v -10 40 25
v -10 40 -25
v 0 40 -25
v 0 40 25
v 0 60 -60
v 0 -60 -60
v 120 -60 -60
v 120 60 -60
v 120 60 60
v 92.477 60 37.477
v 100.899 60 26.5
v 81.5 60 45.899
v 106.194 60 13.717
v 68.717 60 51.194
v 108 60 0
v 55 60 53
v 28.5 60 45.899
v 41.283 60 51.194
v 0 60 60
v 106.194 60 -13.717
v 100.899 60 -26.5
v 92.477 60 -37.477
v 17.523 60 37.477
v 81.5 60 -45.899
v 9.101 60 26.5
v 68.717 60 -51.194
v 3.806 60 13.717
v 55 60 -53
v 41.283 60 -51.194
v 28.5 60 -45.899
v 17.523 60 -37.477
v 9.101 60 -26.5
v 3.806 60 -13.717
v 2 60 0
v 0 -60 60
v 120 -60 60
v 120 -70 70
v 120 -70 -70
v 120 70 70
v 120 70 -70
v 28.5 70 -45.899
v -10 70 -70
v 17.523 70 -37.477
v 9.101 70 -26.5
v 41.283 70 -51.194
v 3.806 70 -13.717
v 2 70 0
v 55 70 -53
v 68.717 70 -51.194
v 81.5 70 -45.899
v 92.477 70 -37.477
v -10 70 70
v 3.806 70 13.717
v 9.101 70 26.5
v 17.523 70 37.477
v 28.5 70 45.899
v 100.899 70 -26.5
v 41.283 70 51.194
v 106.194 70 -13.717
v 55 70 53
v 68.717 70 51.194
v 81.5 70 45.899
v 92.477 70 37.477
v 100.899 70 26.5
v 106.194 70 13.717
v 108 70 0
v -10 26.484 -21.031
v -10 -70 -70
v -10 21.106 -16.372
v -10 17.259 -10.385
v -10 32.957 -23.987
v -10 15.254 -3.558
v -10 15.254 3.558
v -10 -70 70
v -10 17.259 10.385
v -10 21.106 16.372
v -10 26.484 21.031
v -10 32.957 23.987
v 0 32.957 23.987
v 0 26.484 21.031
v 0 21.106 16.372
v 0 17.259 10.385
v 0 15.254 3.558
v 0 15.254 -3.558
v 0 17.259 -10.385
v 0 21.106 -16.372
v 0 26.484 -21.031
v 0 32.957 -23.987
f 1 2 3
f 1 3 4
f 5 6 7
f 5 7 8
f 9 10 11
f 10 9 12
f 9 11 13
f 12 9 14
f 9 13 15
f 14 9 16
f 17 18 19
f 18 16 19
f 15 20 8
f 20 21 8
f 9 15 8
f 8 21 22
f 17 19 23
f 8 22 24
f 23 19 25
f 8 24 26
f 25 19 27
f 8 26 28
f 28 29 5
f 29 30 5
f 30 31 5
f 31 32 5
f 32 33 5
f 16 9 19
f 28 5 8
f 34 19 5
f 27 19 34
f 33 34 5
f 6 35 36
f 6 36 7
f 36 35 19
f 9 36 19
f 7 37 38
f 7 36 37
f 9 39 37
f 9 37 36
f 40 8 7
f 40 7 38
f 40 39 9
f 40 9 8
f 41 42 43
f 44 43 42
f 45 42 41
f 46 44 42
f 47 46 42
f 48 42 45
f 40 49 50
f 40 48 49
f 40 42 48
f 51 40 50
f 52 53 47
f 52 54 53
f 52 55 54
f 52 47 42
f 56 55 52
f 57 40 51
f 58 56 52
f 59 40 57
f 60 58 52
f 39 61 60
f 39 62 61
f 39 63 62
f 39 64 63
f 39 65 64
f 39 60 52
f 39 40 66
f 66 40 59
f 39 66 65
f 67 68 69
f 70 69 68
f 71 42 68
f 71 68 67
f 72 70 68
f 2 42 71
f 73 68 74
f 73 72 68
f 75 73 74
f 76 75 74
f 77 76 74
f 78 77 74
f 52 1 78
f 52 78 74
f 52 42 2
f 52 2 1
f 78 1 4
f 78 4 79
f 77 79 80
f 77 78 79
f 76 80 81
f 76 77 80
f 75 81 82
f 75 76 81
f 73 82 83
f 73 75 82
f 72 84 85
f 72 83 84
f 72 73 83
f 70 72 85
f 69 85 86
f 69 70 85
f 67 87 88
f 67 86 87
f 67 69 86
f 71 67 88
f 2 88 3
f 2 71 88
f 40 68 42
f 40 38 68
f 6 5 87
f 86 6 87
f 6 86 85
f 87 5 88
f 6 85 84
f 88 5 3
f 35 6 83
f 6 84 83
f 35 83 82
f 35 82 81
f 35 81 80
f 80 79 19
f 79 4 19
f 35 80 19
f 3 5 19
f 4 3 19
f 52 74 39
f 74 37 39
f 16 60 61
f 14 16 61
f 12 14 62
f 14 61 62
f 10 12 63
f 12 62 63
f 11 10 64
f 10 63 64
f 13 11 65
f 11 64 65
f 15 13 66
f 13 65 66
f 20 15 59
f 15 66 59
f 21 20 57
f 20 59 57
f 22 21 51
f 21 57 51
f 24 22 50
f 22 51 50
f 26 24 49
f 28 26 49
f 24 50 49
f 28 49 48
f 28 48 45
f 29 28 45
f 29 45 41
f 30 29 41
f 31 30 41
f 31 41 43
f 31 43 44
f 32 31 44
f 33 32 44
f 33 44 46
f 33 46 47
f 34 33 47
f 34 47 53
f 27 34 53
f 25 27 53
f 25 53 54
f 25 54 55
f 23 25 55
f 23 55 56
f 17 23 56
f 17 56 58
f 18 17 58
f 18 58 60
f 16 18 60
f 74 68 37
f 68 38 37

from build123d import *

# Parameters (mm, degrees)
SKETCH2_W           = 140
SKETCH2_H           = 140
SKETCH2_W_2         = 120
SKETCH2_H_2         = 120
EXTRUDE_THIN1_DEPTH = 120
SKETCH3_W           = 140
SKETCH3_H           = 140
BOSS_EXTRUDE1_DEPTH = 10
CUT_EXTRUDE1_REACH  = 199.231
SKETCH5_R           = 53
CUT_EXTRUDE4_REACH  = 165.401


with BuildPart() as part:
    # Sketch2 → Extrude-Thin1 (new body)
    with BuildSketch(Plane(origin=(0, 0, 0), x_dir=(0, 0, -1), z_dir=(1, 0, 0))):
        Rectangle(SKETCH2_W, SKETCH2_H)
        Rectangle(SKETCH2_W_2, SKETCH2_H_2, mode=Mode.SUBTRACT)
    extrude(amount=EXTRUDE_THIN1_DEPTH)

    # Sketch3 → Boss-Extrude1 (add)
    with BuildSketch(Plane.ZY):
        Rectangle(SKETCH3_W, SKETCH3_H)
    extrude(amount=BOSS_EXTRUDE1_DEPTH)

    # Sketch5 → Cut-Extrude1 (cut, up to next)
    with BuildSketch(Plane(origin=(0, 70, 0), x_dir=(1, 0, 0), z_dir=(0, 1, 0)), mode=Mode.PRIVATE) as cut_extrude1_sk1:
        with Locations(Location((55, 0, 0), (0, 0, 270))):
            Circle(SKETCH5_R)
    cut_extrude1_tool1 = extrude(cut_extrude1_sk1.sketch, amount=-CUT_EXTRUDE1_REACH, mode=Mode.PRIVATE) & part.part
    add(cut_extrude1_tool1.solids().sort_by_distance((55, 70, 0))[0], mode=Mode.SUBTRACT)

    # Sketch8 → Cut-Extrude4 (cut, up to next)
    with BuildSketch(Plane.ZY.offset(10), mode=Mode.PRIVATE) as cut_extrude4_sk1:
        with BuildLine():
            Line((-25, 40), (25, 40))
            ThreePointArc((25, 40), (0, 15), (-25, 40))
        make_face()
    cut_extrude4_tool1 = extrude(cut_extrude4_sk1.sketch, amount=-CUT_EXTRUDE4_REACH, mode=Mode.PRIVATE) & part.part
    add(cut_extrude4_tool1.solids().sort_by_distance((-10, 29.38967, 0))[0], mode=Mode.SUBTRACT)


solid = part.part
